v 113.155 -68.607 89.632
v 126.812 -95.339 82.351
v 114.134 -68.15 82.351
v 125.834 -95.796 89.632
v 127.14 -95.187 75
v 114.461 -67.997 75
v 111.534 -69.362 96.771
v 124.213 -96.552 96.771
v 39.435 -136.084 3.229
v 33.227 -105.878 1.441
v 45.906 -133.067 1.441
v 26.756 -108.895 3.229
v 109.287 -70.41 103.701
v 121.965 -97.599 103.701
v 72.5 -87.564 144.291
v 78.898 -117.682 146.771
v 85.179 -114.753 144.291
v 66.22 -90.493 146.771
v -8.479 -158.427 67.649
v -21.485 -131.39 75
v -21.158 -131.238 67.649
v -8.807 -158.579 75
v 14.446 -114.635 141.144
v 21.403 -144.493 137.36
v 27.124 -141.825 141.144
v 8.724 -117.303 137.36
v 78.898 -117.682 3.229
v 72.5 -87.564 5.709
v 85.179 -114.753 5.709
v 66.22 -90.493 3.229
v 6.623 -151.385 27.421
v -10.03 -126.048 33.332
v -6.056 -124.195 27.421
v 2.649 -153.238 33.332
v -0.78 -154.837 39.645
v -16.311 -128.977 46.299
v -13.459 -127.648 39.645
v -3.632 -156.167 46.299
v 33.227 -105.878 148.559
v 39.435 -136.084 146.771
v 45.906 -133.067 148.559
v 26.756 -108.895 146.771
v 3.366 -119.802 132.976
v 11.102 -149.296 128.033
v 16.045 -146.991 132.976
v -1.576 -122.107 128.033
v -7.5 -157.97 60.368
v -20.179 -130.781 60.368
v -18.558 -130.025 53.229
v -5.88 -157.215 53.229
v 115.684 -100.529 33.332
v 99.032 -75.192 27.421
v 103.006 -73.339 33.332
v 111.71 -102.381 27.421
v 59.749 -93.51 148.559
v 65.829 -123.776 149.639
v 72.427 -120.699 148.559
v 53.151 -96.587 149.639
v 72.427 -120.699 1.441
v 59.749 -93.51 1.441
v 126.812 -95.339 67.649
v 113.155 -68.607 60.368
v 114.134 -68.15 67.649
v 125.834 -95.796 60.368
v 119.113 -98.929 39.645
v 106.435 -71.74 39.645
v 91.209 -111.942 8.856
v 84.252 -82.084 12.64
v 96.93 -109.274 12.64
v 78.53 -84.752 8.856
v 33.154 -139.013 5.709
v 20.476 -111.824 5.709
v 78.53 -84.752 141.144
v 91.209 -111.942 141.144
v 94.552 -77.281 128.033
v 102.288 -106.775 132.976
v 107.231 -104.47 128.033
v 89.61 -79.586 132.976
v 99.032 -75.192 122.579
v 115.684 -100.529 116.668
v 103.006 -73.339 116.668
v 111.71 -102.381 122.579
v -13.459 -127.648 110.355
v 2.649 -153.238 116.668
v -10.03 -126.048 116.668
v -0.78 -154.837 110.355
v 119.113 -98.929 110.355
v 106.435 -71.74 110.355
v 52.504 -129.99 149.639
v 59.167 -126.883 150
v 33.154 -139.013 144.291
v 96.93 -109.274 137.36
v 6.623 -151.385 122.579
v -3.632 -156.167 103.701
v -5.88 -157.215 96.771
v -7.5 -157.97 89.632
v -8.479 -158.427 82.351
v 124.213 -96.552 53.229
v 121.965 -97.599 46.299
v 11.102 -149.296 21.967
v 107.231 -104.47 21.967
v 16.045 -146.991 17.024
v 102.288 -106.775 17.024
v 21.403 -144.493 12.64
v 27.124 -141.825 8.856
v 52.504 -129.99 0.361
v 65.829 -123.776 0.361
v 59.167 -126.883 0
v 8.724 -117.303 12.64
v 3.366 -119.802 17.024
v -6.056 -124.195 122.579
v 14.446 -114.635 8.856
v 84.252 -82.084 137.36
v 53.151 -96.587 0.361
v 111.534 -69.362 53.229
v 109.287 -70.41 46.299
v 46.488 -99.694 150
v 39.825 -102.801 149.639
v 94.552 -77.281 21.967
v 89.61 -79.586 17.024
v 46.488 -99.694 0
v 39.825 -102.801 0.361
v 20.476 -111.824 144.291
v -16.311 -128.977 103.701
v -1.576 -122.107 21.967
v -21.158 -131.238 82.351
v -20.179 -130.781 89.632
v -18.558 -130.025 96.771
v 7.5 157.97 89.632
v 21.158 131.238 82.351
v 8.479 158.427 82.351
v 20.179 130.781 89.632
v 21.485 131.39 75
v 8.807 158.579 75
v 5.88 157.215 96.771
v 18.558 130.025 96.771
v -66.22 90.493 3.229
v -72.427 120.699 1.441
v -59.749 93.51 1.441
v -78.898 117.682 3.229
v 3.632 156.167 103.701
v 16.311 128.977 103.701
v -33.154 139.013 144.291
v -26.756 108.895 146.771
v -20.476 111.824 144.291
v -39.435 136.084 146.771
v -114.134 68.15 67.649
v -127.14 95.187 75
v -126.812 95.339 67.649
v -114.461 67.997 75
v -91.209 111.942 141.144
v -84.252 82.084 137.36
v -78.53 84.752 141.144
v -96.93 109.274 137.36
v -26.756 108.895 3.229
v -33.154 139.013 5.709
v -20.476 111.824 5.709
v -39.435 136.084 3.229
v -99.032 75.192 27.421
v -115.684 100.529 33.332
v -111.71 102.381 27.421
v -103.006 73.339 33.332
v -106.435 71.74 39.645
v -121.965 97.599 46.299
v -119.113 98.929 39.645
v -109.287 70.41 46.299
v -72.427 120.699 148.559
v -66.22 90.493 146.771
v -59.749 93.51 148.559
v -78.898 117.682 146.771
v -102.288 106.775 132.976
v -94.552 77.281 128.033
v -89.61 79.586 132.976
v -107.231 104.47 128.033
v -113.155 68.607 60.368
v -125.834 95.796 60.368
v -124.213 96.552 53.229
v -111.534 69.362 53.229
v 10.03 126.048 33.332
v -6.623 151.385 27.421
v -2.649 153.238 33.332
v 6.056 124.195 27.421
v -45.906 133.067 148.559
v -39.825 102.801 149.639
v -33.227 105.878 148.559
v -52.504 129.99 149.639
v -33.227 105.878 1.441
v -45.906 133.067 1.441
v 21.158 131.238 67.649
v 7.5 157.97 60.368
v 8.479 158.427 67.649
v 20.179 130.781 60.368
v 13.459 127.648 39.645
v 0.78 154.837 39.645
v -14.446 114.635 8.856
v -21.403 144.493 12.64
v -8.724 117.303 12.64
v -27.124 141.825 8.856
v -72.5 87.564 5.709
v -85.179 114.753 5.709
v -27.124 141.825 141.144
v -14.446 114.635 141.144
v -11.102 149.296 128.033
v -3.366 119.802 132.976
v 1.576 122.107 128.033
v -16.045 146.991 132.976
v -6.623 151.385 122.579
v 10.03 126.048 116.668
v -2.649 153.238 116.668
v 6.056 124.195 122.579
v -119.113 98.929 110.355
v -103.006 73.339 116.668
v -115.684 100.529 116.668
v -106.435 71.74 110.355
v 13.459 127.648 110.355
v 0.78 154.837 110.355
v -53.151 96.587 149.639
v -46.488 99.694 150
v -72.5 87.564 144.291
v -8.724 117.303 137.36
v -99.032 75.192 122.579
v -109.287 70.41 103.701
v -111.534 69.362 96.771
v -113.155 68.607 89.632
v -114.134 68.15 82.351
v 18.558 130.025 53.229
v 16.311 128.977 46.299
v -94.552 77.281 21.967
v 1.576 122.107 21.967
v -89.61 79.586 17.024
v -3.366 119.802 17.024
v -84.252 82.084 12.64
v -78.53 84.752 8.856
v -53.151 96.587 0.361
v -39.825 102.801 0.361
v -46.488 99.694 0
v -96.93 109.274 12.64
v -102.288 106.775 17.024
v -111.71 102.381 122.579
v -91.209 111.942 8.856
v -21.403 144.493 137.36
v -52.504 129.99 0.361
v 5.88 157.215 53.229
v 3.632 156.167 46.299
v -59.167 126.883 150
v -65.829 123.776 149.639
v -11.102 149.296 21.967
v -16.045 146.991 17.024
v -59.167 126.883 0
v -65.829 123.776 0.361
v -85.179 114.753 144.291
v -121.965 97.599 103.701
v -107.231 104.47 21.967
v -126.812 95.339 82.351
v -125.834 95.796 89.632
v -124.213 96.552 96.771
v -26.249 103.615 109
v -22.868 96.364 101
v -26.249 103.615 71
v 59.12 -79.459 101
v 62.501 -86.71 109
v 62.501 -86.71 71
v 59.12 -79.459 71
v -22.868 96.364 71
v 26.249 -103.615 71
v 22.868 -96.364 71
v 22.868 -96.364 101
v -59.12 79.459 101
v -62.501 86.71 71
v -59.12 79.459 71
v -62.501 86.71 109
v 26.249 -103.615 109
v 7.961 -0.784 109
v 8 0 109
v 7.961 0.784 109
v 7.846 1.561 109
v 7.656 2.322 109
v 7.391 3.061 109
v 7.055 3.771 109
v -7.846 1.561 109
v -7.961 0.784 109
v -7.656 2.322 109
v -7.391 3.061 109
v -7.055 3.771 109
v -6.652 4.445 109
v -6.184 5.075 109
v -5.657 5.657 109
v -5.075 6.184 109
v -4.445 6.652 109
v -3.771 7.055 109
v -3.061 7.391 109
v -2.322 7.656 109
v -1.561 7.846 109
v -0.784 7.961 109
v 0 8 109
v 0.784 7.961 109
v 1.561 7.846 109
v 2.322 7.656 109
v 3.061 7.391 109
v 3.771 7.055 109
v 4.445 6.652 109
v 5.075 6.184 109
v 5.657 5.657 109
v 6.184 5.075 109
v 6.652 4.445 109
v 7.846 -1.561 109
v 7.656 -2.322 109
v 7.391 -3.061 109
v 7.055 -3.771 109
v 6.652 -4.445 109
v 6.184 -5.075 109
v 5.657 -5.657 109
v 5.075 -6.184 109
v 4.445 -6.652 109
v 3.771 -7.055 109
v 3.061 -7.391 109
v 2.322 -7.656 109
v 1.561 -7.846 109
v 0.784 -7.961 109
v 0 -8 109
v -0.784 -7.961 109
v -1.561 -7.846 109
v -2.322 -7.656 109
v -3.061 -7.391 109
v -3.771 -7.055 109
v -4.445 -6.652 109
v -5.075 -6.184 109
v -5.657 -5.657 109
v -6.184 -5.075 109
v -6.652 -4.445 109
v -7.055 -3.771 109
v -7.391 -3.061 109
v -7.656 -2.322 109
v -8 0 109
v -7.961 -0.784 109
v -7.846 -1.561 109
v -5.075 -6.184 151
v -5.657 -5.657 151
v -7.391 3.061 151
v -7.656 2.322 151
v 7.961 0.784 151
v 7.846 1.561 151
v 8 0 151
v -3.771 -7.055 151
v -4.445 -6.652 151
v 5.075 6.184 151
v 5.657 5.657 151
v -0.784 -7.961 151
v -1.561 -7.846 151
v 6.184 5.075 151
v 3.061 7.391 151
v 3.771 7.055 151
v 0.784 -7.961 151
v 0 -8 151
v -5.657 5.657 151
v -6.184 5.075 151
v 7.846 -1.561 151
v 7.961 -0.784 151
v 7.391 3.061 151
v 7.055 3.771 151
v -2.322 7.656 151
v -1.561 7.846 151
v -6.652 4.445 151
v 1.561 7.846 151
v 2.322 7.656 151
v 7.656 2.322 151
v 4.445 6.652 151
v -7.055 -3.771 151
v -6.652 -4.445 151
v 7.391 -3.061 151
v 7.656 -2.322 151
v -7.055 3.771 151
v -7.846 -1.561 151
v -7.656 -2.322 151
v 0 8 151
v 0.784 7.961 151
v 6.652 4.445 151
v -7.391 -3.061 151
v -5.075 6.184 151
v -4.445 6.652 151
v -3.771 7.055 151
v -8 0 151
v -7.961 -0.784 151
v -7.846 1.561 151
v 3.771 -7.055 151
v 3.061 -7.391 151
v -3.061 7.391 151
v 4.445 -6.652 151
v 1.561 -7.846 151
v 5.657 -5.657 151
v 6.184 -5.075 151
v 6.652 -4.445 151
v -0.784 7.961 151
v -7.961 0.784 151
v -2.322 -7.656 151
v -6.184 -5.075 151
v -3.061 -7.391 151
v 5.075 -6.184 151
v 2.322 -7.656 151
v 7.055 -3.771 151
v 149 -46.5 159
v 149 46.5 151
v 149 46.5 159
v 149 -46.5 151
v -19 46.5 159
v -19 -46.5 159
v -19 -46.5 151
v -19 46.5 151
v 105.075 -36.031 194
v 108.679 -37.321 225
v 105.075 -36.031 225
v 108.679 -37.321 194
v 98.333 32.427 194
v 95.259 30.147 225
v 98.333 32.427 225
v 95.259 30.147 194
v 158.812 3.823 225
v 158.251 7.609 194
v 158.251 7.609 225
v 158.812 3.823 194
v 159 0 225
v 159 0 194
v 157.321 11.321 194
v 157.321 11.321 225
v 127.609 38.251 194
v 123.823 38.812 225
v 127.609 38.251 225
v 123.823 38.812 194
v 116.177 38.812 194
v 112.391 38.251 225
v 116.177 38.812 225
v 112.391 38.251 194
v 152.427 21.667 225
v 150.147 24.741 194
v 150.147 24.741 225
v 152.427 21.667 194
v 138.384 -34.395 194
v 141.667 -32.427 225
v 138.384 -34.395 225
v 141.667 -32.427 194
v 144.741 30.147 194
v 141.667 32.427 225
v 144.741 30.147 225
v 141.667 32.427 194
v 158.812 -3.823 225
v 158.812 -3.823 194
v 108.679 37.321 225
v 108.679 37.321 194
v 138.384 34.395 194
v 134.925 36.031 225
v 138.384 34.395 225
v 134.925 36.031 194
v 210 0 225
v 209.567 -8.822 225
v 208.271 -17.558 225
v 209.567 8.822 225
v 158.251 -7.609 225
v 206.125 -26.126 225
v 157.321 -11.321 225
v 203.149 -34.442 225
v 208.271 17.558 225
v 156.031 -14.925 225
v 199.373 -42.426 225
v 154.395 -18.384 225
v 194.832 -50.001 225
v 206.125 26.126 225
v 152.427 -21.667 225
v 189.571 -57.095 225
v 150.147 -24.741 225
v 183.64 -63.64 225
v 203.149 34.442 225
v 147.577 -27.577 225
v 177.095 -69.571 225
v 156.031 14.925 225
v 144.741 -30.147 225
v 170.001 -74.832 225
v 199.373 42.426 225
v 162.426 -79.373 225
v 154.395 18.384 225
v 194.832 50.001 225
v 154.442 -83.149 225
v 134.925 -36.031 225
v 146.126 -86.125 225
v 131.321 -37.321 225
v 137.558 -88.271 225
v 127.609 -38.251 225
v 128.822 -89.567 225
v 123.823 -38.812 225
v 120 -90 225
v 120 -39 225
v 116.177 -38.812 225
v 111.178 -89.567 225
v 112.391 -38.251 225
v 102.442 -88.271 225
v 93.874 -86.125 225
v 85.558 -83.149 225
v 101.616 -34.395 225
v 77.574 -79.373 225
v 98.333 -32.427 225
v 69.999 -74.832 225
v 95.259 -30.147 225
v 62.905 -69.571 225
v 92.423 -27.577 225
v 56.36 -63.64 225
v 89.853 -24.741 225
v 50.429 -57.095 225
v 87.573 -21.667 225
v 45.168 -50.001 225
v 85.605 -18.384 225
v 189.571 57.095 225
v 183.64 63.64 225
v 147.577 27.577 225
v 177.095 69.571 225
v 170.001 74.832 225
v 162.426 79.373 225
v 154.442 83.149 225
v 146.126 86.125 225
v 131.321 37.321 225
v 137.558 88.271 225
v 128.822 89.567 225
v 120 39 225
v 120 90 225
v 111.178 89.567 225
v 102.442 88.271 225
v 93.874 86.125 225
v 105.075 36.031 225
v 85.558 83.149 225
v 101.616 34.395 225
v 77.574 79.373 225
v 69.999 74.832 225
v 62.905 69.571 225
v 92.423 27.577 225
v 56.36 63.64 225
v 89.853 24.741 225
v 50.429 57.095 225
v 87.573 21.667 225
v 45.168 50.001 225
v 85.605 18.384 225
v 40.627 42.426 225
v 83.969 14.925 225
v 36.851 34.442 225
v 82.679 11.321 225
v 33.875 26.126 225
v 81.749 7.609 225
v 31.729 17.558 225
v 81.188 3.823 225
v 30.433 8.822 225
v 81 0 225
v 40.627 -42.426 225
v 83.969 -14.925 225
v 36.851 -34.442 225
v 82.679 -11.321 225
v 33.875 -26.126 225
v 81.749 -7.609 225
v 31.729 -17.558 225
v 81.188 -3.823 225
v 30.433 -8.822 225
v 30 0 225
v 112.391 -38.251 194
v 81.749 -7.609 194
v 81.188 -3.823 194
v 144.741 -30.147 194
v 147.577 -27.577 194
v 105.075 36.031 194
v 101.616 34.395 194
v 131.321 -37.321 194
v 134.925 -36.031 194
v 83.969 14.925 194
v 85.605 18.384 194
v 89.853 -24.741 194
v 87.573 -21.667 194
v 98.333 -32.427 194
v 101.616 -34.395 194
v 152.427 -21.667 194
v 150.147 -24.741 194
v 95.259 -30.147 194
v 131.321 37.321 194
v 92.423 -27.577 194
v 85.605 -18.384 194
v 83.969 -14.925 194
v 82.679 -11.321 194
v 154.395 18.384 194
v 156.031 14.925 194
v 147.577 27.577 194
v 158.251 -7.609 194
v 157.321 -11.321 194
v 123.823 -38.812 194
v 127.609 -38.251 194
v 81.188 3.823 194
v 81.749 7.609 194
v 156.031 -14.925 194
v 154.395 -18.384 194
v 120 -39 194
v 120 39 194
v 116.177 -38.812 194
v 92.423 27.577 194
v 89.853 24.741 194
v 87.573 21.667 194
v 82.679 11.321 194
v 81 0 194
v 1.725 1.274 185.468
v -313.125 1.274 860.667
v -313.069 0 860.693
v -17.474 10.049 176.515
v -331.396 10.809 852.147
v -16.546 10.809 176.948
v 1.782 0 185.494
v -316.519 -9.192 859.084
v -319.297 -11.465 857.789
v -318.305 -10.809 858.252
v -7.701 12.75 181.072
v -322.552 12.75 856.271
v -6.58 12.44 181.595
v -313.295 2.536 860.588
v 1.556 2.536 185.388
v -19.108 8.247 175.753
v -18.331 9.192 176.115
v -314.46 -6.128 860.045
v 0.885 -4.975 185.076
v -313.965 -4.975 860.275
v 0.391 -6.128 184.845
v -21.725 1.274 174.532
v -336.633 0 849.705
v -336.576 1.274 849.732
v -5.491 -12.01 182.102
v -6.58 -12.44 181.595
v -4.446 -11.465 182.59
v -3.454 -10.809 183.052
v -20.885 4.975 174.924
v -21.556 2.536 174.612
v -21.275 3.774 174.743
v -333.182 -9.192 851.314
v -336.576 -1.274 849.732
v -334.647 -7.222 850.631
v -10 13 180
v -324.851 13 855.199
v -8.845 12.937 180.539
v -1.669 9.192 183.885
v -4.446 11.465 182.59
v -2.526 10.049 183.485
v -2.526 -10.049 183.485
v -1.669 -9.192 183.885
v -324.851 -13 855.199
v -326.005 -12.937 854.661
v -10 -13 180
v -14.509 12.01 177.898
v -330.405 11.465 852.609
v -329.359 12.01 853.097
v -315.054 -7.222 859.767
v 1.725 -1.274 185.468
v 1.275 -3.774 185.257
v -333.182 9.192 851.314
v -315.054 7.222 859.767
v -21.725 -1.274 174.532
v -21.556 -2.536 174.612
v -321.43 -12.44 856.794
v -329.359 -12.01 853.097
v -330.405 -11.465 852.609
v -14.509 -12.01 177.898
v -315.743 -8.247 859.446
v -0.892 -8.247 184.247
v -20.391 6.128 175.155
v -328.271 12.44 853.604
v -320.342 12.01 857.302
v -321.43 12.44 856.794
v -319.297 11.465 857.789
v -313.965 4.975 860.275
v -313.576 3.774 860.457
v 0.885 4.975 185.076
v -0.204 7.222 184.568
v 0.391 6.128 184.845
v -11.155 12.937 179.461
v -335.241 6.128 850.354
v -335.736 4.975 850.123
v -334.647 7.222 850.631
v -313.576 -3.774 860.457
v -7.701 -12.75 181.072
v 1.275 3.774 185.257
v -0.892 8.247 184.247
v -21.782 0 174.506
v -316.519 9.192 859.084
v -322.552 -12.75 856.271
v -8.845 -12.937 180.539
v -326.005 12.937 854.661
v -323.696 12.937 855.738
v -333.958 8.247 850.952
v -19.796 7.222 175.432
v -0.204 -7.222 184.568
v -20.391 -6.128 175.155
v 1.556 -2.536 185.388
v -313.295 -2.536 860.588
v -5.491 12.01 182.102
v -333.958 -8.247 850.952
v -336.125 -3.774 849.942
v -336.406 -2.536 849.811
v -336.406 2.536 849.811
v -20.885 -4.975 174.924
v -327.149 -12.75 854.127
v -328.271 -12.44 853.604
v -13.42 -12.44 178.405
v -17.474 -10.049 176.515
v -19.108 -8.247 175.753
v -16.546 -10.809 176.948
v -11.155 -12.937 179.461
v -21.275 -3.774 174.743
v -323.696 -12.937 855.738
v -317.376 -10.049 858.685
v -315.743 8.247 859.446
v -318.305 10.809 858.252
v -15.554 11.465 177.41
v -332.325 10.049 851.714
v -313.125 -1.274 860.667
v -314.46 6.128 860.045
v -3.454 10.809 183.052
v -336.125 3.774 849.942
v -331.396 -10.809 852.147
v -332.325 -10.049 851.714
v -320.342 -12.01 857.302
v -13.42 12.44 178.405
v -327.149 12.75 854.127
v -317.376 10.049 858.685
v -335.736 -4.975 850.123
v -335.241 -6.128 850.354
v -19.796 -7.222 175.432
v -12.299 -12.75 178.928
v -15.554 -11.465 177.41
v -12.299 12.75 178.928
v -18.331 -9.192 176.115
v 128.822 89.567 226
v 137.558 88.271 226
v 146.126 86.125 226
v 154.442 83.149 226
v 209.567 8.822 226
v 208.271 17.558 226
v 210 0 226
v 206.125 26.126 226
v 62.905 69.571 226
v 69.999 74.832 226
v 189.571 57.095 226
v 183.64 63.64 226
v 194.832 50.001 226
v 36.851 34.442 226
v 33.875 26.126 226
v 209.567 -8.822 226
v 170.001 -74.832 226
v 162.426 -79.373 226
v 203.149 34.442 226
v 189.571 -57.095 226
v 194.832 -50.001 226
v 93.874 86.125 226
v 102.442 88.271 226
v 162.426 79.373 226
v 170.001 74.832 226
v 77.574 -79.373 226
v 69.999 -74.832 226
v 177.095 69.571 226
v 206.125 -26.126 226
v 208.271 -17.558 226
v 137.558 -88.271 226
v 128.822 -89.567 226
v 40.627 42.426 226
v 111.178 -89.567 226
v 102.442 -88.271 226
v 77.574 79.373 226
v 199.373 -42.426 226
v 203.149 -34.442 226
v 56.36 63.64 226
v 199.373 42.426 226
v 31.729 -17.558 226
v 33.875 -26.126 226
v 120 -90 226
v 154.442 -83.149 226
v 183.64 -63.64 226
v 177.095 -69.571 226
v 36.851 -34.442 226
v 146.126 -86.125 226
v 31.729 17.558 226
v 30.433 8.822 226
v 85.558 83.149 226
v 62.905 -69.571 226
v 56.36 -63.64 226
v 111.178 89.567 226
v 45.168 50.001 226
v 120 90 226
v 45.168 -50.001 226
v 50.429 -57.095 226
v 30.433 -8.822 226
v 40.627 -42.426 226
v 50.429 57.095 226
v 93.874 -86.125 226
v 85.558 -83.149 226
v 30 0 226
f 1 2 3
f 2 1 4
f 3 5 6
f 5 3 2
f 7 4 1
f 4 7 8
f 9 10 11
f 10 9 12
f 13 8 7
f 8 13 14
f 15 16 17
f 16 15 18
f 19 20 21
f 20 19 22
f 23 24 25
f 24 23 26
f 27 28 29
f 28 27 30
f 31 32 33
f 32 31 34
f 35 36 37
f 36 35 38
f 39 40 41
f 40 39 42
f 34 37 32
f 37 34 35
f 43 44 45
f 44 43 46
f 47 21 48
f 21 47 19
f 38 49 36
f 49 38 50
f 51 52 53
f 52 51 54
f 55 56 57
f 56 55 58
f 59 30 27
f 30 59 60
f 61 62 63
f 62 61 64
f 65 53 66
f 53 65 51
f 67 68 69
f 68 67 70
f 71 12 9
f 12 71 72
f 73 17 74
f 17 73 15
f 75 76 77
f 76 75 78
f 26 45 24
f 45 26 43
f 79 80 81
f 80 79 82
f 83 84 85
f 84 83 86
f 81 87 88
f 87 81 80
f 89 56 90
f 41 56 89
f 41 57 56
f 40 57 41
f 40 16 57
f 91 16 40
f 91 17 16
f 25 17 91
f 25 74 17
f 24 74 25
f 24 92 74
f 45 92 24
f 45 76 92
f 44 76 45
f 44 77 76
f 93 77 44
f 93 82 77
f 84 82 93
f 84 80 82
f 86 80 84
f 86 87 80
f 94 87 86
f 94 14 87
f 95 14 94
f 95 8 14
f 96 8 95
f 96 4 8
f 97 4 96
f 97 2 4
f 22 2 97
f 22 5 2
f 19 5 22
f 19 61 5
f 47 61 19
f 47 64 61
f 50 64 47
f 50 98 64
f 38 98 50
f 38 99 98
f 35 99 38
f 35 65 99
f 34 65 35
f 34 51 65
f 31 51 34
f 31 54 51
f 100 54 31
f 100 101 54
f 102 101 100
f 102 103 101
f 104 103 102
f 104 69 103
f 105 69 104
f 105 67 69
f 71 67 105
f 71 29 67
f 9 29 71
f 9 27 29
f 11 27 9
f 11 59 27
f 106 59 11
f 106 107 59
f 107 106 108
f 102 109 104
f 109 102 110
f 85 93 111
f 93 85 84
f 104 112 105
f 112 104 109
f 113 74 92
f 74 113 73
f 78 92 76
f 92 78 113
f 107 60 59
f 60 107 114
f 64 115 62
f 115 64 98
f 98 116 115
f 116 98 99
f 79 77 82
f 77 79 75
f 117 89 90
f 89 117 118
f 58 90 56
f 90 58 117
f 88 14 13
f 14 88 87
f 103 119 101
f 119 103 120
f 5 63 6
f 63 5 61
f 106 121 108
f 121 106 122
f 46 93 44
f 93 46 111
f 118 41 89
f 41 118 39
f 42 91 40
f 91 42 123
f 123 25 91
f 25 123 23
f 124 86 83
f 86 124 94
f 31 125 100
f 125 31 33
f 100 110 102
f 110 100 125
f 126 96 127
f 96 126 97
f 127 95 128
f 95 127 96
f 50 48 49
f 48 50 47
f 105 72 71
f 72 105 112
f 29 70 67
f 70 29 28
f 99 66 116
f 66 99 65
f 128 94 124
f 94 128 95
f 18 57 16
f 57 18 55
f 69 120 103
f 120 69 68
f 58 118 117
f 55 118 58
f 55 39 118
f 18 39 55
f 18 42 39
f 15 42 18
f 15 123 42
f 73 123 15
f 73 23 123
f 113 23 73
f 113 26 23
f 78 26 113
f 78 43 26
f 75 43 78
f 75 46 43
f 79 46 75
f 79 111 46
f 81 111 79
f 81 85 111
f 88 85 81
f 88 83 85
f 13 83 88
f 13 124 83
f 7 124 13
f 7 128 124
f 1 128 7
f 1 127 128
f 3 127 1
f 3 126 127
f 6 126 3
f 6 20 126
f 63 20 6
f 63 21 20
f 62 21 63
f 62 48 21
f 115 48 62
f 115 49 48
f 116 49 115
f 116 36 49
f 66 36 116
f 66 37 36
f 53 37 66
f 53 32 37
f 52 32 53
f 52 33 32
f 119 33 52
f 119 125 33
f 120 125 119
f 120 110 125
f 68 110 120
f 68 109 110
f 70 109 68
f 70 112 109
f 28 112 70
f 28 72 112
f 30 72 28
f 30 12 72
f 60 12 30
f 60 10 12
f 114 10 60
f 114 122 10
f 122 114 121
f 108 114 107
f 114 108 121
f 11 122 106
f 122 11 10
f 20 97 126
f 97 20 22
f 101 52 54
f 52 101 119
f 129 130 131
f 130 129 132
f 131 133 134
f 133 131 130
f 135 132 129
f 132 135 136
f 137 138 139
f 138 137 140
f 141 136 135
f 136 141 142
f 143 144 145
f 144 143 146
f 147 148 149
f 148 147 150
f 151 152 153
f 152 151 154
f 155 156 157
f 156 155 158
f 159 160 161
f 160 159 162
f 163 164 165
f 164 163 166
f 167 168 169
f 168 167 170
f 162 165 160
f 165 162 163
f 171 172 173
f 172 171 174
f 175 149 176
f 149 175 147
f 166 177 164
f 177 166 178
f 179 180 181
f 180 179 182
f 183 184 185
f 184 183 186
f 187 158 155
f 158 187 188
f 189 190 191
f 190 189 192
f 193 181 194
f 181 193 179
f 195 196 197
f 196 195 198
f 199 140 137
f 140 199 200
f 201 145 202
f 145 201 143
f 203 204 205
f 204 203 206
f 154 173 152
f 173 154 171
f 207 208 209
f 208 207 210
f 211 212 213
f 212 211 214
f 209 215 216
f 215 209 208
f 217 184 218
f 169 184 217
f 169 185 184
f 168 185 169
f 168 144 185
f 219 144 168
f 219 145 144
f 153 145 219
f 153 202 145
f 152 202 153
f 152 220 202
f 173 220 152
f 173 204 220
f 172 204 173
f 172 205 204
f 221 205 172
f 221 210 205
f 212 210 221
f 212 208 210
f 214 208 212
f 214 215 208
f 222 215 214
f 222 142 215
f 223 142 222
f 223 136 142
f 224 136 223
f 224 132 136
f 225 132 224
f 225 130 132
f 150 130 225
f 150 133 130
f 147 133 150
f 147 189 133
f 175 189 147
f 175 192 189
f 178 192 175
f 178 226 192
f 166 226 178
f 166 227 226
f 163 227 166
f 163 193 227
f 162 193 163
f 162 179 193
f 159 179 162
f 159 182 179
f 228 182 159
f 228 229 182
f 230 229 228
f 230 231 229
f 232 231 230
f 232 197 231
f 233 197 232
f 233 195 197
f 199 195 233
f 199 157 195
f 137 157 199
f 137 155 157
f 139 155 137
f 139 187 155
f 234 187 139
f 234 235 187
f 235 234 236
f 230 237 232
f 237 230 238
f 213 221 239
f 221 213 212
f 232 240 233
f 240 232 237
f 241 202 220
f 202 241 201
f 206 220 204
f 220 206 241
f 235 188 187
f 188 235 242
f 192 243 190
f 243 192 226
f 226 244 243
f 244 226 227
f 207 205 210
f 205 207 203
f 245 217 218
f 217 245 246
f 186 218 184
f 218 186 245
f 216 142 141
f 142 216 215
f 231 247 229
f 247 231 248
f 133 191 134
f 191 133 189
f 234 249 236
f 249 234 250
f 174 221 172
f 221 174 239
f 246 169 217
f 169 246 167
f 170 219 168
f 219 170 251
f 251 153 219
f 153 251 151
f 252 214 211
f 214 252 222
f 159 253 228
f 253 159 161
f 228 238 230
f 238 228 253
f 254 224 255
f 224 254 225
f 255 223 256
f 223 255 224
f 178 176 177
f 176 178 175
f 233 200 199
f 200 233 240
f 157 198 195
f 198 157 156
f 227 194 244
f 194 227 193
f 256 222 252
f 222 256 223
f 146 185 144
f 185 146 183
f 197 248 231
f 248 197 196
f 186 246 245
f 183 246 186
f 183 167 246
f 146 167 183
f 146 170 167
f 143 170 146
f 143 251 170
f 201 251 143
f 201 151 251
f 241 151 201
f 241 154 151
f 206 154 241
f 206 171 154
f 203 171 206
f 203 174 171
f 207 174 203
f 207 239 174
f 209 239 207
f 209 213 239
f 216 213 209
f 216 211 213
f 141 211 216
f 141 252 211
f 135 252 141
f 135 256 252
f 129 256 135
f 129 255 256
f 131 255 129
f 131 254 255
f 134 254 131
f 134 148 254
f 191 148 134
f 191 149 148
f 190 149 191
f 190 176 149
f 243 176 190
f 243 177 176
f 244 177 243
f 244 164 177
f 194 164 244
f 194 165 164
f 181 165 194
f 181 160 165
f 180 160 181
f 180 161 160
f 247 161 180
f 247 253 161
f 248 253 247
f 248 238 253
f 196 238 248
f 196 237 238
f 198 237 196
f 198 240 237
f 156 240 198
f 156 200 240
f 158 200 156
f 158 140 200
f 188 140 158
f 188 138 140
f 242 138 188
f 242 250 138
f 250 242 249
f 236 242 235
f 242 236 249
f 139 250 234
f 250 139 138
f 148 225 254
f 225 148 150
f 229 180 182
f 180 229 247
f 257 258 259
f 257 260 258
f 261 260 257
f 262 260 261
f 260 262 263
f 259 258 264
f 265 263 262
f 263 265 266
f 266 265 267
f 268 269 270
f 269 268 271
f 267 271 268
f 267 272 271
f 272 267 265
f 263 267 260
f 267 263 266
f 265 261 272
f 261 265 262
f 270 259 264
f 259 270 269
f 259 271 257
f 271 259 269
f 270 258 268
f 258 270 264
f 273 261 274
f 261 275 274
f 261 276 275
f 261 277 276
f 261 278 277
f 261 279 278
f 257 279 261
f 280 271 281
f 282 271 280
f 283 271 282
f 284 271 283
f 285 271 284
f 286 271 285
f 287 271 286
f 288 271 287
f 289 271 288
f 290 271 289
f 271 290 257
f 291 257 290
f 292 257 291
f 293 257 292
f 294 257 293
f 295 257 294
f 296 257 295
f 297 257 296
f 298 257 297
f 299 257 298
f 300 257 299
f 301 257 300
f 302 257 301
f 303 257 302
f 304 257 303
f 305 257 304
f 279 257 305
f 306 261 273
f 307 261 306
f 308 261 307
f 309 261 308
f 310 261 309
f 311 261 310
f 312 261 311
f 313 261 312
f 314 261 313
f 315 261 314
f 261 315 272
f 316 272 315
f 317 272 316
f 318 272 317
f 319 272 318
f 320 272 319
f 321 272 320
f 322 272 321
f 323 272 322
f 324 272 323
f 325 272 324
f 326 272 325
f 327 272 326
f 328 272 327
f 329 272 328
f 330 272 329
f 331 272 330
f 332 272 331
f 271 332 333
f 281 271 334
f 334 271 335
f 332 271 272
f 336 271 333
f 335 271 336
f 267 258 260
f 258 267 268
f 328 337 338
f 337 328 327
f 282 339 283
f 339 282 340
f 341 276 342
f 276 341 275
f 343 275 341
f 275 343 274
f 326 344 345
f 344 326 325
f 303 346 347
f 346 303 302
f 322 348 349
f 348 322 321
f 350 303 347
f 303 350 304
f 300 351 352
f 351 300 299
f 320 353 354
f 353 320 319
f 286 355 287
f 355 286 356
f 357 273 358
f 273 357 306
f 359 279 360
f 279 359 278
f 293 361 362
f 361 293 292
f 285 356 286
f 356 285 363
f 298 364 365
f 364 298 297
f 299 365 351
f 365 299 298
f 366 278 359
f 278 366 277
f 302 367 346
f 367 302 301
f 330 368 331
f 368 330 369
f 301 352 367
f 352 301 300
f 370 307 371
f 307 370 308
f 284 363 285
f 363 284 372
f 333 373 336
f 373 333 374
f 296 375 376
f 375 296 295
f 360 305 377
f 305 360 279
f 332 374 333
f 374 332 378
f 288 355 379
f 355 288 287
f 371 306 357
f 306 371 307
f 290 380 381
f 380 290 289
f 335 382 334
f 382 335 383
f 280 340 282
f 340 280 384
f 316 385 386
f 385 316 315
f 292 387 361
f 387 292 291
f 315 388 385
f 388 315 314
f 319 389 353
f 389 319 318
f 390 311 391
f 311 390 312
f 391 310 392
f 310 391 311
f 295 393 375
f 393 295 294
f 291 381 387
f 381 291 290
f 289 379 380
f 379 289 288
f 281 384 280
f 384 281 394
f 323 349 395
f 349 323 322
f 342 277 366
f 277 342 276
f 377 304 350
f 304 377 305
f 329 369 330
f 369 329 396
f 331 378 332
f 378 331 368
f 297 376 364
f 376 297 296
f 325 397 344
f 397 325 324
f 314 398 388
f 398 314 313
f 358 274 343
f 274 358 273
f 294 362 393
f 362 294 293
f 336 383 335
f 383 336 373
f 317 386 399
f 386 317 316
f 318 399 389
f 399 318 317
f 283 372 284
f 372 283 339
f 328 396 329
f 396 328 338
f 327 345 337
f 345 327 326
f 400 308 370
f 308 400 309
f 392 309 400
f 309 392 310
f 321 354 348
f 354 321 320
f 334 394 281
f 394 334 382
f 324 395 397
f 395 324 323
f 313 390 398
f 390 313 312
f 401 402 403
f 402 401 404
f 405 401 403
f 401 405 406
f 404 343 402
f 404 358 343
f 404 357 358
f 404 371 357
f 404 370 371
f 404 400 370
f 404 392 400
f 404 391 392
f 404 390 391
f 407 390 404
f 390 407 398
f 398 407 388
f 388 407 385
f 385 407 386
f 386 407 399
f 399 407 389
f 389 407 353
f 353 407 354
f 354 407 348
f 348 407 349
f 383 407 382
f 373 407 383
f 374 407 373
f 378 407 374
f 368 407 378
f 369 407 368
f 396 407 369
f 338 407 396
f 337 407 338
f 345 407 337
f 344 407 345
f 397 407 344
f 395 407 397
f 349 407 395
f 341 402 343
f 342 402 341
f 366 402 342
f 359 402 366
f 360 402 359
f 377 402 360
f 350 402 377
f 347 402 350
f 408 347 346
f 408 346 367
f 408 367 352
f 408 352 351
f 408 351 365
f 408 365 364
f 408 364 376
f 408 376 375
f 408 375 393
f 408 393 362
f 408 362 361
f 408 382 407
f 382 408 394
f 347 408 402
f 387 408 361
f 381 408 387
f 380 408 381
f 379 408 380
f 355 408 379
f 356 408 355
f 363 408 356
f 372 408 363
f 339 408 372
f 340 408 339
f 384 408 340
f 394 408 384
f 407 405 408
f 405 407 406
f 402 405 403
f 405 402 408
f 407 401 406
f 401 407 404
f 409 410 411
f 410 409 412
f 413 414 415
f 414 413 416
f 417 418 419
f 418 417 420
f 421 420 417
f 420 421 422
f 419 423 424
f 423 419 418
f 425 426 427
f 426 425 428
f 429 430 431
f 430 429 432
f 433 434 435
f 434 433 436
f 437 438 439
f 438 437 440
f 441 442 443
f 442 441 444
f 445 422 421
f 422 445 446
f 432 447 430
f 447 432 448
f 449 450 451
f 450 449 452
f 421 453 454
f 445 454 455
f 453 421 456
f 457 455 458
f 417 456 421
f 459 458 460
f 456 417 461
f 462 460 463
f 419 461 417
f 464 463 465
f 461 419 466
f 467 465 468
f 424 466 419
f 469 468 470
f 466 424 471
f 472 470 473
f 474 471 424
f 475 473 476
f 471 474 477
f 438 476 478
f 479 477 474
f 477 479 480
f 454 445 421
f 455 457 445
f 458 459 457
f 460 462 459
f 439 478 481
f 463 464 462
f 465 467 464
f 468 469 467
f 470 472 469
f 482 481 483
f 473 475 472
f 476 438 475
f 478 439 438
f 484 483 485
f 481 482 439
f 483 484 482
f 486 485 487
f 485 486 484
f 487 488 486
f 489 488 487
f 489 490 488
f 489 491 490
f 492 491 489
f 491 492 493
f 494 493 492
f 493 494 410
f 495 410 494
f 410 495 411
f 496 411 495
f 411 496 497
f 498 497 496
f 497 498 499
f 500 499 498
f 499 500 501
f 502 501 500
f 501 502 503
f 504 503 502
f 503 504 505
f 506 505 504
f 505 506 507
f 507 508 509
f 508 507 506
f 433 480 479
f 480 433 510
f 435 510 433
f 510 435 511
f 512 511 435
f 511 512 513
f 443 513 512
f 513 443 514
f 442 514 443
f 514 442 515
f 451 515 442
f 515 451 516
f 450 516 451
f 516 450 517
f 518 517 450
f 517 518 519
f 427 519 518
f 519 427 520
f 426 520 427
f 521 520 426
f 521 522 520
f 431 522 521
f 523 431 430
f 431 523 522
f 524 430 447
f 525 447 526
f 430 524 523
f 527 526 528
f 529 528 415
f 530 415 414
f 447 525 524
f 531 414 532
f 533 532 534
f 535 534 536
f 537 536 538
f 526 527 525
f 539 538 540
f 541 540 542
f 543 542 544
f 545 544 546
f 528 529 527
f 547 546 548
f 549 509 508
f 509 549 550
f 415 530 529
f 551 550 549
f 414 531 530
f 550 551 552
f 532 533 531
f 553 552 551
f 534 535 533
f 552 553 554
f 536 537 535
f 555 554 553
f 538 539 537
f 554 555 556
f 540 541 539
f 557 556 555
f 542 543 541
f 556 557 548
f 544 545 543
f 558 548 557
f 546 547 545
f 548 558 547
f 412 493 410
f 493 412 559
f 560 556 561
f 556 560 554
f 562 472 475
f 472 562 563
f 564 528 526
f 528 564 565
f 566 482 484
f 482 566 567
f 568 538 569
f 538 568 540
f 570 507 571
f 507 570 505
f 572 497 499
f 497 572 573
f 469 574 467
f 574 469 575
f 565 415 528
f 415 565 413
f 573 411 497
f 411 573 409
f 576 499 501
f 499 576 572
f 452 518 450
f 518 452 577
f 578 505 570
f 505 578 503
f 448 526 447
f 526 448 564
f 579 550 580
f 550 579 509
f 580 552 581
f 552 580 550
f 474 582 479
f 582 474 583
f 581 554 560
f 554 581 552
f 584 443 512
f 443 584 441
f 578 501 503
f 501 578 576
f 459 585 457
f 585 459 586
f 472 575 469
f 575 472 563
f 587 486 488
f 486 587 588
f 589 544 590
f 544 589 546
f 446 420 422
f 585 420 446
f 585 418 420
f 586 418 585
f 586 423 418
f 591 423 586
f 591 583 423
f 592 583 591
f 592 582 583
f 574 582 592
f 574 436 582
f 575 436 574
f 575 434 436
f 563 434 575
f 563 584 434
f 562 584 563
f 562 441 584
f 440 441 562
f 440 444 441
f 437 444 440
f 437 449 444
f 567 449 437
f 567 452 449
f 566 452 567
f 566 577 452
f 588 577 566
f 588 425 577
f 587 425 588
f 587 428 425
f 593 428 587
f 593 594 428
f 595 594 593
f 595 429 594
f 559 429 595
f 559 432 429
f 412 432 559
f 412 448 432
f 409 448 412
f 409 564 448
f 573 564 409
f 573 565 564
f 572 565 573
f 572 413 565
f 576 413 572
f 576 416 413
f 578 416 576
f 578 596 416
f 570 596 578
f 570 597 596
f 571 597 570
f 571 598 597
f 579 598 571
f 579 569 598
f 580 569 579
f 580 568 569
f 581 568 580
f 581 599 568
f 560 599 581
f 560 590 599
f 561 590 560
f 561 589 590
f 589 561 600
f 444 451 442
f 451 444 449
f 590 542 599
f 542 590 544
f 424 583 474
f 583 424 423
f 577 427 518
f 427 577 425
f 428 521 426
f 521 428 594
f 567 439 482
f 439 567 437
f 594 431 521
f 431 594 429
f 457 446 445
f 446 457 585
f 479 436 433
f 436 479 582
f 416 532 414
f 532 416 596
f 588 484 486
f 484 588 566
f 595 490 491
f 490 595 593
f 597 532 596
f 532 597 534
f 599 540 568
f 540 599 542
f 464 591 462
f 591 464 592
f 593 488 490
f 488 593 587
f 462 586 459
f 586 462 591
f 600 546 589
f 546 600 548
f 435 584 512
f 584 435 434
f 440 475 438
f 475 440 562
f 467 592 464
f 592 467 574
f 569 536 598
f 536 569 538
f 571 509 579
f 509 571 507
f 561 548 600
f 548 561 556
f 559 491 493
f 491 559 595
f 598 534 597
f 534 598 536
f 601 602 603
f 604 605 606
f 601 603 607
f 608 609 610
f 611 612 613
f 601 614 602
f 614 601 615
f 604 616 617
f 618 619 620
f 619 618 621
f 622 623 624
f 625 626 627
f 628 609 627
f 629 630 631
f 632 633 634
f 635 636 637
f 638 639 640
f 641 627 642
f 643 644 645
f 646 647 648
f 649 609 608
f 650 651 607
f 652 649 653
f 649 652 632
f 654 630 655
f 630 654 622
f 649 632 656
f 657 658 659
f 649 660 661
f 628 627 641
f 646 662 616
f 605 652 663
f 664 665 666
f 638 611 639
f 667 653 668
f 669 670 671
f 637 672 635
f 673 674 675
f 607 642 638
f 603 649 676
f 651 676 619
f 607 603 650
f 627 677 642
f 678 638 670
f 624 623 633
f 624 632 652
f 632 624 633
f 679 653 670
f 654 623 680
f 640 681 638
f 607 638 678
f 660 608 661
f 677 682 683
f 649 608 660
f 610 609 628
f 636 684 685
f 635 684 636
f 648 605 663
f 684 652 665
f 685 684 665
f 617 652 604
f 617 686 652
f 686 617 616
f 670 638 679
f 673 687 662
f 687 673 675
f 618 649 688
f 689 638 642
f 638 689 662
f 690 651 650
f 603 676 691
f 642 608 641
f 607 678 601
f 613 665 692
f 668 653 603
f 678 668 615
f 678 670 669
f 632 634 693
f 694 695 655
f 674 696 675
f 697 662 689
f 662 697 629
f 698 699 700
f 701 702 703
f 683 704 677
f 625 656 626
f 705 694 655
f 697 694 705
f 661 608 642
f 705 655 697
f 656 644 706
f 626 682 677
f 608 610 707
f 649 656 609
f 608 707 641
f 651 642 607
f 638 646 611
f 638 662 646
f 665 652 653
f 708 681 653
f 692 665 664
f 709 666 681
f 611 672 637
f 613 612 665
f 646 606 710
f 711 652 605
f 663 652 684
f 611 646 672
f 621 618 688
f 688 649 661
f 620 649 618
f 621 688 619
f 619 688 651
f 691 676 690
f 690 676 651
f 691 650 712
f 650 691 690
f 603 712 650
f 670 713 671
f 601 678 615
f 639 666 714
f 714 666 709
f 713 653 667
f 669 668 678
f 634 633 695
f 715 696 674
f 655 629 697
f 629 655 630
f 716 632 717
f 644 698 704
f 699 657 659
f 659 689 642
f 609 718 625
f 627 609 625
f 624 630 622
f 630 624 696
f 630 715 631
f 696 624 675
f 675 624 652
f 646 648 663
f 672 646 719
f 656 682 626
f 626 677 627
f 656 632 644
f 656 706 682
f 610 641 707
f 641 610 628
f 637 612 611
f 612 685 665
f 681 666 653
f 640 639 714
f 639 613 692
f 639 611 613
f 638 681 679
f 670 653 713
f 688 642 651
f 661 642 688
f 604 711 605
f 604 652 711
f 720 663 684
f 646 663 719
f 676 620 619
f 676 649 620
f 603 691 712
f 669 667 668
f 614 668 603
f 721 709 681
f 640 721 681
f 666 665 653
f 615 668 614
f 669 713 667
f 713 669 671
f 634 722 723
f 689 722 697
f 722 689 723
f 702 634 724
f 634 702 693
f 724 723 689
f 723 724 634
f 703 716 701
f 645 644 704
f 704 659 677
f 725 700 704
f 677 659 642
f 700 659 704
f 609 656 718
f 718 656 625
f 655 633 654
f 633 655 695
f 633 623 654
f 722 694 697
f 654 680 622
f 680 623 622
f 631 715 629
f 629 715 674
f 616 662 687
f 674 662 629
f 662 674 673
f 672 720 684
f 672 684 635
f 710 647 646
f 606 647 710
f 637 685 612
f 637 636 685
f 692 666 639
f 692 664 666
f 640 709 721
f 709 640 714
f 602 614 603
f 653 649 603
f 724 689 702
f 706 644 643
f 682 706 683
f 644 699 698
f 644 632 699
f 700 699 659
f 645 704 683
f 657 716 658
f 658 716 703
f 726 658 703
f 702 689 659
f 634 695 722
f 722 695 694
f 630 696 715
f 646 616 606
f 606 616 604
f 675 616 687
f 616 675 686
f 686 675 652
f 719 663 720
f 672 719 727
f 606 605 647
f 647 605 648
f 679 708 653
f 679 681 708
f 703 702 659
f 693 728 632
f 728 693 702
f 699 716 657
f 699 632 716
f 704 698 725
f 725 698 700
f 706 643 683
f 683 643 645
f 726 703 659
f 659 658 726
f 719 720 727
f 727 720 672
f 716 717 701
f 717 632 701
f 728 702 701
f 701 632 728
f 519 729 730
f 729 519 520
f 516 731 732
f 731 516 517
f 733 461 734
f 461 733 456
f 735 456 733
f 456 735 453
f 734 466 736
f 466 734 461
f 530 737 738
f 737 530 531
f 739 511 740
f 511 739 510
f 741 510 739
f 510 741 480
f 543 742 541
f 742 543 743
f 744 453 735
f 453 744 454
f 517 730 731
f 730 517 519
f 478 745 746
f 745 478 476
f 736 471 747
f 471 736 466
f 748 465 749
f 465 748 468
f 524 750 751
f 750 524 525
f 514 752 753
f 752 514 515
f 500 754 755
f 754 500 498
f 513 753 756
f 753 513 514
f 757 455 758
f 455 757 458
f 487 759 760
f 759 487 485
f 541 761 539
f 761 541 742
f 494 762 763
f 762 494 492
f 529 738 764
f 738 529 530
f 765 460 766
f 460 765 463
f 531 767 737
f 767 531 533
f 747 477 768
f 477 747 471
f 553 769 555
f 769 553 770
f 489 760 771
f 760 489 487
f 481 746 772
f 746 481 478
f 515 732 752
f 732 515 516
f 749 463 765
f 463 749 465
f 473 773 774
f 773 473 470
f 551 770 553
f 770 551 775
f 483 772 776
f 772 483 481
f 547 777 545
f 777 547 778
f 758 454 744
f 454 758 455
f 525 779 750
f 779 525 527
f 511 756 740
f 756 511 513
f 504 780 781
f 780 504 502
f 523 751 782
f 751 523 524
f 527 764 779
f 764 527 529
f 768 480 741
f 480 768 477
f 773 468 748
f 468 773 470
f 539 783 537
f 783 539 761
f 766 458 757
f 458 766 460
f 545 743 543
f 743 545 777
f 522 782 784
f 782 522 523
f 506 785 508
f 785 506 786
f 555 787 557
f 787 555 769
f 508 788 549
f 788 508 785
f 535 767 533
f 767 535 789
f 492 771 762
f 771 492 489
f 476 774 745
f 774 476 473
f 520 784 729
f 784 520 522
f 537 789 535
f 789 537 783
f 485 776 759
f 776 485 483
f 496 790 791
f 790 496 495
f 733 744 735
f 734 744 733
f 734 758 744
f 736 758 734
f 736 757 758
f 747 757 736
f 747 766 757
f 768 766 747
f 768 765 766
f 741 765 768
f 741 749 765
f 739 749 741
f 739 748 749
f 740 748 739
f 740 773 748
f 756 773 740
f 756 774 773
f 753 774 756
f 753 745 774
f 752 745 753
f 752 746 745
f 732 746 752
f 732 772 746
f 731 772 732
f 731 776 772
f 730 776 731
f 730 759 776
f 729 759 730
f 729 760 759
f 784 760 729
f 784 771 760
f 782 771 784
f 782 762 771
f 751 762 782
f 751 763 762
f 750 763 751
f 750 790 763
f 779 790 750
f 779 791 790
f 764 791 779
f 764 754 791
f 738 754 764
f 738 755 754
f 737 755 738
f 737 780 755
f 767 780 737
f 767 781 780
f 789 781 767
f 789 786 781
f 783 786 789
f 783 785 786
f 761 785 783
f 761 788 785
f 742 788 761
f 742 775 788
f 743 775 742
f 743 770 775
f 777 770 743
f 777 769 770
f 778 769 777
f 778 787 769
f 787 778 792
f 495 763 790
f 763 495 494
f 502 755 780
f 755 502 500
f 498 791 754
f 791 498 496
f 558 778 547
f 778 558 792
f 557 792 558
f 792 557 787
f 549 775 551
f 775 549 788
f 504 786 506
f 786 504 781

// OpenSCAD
// Conceptual assembly layout. Dimensions are in millimetres.
// Set view_mode to "top" for a projected layout. Measure purchased parts before fabrication.
$fn = 64;
view_mode = "assembly";  // [assembly,top]
wheel_diameter = 150;
wheel_width = 30;
wheel_track = 250;
wheel_angle = 25;        // degrees, left positive
scan_height = 225;
lidar_forward = 120;     // longitudinal distance from steering pivot

axle_z = wheel_diameter / 2;
pivot_z = axle_z + 50;
bridge_width = wheel_track - wheel_width - 10;

module wheel_frame() {
    rotate([0, 0, wheel_angle]) {
        color("dimgray")
            for (side = [-1, 1]) {
                translate([0, side * wheel_track / 2, axle_z])
                    rotate([90, 0, 0]) cylinder(d=wheel_diameter, h=wheel_width, center=true);
            }
        color("steelblue") {
            translate([0, 0, axle_z + 30]) cube([40, bridge_width, 8], center=true);
            for (side = [-1, 1]) {
                translate([0, side * (bridge_width / 2 - 4), axle_z + 13])
                    cube([40, 8, 34], center=true);
            }
        }
    }
}

module assembly() {
    wheel_frame();
    color("silver") translate([0, 0, axle_z + 30]) cylinder(d=16, h=53);
    color("dodgerblue") translate([65, 0, pivot_z + 30]) cube([168, 93, 8], center=true);
    color("goldenrod") translate([lidar_forward, 0, scan_height - 31]) cylinder(d=78, h=31);
    color("gray") translate([-10, 0, pivot_z + 55]) rotate([0, -25, 0]) cylinder(d=26, h=745);
    if (view_mode == "assembly") {
        color([0.9, 0.2, 0.1, 0.25]) translate([lidar_forward, 0, scan_height]) cylinder(d=180, h=1);
    }
}

if (view_mode == "top") {
    projection(cut=false) assembly();
} else {
    assembly();
}
